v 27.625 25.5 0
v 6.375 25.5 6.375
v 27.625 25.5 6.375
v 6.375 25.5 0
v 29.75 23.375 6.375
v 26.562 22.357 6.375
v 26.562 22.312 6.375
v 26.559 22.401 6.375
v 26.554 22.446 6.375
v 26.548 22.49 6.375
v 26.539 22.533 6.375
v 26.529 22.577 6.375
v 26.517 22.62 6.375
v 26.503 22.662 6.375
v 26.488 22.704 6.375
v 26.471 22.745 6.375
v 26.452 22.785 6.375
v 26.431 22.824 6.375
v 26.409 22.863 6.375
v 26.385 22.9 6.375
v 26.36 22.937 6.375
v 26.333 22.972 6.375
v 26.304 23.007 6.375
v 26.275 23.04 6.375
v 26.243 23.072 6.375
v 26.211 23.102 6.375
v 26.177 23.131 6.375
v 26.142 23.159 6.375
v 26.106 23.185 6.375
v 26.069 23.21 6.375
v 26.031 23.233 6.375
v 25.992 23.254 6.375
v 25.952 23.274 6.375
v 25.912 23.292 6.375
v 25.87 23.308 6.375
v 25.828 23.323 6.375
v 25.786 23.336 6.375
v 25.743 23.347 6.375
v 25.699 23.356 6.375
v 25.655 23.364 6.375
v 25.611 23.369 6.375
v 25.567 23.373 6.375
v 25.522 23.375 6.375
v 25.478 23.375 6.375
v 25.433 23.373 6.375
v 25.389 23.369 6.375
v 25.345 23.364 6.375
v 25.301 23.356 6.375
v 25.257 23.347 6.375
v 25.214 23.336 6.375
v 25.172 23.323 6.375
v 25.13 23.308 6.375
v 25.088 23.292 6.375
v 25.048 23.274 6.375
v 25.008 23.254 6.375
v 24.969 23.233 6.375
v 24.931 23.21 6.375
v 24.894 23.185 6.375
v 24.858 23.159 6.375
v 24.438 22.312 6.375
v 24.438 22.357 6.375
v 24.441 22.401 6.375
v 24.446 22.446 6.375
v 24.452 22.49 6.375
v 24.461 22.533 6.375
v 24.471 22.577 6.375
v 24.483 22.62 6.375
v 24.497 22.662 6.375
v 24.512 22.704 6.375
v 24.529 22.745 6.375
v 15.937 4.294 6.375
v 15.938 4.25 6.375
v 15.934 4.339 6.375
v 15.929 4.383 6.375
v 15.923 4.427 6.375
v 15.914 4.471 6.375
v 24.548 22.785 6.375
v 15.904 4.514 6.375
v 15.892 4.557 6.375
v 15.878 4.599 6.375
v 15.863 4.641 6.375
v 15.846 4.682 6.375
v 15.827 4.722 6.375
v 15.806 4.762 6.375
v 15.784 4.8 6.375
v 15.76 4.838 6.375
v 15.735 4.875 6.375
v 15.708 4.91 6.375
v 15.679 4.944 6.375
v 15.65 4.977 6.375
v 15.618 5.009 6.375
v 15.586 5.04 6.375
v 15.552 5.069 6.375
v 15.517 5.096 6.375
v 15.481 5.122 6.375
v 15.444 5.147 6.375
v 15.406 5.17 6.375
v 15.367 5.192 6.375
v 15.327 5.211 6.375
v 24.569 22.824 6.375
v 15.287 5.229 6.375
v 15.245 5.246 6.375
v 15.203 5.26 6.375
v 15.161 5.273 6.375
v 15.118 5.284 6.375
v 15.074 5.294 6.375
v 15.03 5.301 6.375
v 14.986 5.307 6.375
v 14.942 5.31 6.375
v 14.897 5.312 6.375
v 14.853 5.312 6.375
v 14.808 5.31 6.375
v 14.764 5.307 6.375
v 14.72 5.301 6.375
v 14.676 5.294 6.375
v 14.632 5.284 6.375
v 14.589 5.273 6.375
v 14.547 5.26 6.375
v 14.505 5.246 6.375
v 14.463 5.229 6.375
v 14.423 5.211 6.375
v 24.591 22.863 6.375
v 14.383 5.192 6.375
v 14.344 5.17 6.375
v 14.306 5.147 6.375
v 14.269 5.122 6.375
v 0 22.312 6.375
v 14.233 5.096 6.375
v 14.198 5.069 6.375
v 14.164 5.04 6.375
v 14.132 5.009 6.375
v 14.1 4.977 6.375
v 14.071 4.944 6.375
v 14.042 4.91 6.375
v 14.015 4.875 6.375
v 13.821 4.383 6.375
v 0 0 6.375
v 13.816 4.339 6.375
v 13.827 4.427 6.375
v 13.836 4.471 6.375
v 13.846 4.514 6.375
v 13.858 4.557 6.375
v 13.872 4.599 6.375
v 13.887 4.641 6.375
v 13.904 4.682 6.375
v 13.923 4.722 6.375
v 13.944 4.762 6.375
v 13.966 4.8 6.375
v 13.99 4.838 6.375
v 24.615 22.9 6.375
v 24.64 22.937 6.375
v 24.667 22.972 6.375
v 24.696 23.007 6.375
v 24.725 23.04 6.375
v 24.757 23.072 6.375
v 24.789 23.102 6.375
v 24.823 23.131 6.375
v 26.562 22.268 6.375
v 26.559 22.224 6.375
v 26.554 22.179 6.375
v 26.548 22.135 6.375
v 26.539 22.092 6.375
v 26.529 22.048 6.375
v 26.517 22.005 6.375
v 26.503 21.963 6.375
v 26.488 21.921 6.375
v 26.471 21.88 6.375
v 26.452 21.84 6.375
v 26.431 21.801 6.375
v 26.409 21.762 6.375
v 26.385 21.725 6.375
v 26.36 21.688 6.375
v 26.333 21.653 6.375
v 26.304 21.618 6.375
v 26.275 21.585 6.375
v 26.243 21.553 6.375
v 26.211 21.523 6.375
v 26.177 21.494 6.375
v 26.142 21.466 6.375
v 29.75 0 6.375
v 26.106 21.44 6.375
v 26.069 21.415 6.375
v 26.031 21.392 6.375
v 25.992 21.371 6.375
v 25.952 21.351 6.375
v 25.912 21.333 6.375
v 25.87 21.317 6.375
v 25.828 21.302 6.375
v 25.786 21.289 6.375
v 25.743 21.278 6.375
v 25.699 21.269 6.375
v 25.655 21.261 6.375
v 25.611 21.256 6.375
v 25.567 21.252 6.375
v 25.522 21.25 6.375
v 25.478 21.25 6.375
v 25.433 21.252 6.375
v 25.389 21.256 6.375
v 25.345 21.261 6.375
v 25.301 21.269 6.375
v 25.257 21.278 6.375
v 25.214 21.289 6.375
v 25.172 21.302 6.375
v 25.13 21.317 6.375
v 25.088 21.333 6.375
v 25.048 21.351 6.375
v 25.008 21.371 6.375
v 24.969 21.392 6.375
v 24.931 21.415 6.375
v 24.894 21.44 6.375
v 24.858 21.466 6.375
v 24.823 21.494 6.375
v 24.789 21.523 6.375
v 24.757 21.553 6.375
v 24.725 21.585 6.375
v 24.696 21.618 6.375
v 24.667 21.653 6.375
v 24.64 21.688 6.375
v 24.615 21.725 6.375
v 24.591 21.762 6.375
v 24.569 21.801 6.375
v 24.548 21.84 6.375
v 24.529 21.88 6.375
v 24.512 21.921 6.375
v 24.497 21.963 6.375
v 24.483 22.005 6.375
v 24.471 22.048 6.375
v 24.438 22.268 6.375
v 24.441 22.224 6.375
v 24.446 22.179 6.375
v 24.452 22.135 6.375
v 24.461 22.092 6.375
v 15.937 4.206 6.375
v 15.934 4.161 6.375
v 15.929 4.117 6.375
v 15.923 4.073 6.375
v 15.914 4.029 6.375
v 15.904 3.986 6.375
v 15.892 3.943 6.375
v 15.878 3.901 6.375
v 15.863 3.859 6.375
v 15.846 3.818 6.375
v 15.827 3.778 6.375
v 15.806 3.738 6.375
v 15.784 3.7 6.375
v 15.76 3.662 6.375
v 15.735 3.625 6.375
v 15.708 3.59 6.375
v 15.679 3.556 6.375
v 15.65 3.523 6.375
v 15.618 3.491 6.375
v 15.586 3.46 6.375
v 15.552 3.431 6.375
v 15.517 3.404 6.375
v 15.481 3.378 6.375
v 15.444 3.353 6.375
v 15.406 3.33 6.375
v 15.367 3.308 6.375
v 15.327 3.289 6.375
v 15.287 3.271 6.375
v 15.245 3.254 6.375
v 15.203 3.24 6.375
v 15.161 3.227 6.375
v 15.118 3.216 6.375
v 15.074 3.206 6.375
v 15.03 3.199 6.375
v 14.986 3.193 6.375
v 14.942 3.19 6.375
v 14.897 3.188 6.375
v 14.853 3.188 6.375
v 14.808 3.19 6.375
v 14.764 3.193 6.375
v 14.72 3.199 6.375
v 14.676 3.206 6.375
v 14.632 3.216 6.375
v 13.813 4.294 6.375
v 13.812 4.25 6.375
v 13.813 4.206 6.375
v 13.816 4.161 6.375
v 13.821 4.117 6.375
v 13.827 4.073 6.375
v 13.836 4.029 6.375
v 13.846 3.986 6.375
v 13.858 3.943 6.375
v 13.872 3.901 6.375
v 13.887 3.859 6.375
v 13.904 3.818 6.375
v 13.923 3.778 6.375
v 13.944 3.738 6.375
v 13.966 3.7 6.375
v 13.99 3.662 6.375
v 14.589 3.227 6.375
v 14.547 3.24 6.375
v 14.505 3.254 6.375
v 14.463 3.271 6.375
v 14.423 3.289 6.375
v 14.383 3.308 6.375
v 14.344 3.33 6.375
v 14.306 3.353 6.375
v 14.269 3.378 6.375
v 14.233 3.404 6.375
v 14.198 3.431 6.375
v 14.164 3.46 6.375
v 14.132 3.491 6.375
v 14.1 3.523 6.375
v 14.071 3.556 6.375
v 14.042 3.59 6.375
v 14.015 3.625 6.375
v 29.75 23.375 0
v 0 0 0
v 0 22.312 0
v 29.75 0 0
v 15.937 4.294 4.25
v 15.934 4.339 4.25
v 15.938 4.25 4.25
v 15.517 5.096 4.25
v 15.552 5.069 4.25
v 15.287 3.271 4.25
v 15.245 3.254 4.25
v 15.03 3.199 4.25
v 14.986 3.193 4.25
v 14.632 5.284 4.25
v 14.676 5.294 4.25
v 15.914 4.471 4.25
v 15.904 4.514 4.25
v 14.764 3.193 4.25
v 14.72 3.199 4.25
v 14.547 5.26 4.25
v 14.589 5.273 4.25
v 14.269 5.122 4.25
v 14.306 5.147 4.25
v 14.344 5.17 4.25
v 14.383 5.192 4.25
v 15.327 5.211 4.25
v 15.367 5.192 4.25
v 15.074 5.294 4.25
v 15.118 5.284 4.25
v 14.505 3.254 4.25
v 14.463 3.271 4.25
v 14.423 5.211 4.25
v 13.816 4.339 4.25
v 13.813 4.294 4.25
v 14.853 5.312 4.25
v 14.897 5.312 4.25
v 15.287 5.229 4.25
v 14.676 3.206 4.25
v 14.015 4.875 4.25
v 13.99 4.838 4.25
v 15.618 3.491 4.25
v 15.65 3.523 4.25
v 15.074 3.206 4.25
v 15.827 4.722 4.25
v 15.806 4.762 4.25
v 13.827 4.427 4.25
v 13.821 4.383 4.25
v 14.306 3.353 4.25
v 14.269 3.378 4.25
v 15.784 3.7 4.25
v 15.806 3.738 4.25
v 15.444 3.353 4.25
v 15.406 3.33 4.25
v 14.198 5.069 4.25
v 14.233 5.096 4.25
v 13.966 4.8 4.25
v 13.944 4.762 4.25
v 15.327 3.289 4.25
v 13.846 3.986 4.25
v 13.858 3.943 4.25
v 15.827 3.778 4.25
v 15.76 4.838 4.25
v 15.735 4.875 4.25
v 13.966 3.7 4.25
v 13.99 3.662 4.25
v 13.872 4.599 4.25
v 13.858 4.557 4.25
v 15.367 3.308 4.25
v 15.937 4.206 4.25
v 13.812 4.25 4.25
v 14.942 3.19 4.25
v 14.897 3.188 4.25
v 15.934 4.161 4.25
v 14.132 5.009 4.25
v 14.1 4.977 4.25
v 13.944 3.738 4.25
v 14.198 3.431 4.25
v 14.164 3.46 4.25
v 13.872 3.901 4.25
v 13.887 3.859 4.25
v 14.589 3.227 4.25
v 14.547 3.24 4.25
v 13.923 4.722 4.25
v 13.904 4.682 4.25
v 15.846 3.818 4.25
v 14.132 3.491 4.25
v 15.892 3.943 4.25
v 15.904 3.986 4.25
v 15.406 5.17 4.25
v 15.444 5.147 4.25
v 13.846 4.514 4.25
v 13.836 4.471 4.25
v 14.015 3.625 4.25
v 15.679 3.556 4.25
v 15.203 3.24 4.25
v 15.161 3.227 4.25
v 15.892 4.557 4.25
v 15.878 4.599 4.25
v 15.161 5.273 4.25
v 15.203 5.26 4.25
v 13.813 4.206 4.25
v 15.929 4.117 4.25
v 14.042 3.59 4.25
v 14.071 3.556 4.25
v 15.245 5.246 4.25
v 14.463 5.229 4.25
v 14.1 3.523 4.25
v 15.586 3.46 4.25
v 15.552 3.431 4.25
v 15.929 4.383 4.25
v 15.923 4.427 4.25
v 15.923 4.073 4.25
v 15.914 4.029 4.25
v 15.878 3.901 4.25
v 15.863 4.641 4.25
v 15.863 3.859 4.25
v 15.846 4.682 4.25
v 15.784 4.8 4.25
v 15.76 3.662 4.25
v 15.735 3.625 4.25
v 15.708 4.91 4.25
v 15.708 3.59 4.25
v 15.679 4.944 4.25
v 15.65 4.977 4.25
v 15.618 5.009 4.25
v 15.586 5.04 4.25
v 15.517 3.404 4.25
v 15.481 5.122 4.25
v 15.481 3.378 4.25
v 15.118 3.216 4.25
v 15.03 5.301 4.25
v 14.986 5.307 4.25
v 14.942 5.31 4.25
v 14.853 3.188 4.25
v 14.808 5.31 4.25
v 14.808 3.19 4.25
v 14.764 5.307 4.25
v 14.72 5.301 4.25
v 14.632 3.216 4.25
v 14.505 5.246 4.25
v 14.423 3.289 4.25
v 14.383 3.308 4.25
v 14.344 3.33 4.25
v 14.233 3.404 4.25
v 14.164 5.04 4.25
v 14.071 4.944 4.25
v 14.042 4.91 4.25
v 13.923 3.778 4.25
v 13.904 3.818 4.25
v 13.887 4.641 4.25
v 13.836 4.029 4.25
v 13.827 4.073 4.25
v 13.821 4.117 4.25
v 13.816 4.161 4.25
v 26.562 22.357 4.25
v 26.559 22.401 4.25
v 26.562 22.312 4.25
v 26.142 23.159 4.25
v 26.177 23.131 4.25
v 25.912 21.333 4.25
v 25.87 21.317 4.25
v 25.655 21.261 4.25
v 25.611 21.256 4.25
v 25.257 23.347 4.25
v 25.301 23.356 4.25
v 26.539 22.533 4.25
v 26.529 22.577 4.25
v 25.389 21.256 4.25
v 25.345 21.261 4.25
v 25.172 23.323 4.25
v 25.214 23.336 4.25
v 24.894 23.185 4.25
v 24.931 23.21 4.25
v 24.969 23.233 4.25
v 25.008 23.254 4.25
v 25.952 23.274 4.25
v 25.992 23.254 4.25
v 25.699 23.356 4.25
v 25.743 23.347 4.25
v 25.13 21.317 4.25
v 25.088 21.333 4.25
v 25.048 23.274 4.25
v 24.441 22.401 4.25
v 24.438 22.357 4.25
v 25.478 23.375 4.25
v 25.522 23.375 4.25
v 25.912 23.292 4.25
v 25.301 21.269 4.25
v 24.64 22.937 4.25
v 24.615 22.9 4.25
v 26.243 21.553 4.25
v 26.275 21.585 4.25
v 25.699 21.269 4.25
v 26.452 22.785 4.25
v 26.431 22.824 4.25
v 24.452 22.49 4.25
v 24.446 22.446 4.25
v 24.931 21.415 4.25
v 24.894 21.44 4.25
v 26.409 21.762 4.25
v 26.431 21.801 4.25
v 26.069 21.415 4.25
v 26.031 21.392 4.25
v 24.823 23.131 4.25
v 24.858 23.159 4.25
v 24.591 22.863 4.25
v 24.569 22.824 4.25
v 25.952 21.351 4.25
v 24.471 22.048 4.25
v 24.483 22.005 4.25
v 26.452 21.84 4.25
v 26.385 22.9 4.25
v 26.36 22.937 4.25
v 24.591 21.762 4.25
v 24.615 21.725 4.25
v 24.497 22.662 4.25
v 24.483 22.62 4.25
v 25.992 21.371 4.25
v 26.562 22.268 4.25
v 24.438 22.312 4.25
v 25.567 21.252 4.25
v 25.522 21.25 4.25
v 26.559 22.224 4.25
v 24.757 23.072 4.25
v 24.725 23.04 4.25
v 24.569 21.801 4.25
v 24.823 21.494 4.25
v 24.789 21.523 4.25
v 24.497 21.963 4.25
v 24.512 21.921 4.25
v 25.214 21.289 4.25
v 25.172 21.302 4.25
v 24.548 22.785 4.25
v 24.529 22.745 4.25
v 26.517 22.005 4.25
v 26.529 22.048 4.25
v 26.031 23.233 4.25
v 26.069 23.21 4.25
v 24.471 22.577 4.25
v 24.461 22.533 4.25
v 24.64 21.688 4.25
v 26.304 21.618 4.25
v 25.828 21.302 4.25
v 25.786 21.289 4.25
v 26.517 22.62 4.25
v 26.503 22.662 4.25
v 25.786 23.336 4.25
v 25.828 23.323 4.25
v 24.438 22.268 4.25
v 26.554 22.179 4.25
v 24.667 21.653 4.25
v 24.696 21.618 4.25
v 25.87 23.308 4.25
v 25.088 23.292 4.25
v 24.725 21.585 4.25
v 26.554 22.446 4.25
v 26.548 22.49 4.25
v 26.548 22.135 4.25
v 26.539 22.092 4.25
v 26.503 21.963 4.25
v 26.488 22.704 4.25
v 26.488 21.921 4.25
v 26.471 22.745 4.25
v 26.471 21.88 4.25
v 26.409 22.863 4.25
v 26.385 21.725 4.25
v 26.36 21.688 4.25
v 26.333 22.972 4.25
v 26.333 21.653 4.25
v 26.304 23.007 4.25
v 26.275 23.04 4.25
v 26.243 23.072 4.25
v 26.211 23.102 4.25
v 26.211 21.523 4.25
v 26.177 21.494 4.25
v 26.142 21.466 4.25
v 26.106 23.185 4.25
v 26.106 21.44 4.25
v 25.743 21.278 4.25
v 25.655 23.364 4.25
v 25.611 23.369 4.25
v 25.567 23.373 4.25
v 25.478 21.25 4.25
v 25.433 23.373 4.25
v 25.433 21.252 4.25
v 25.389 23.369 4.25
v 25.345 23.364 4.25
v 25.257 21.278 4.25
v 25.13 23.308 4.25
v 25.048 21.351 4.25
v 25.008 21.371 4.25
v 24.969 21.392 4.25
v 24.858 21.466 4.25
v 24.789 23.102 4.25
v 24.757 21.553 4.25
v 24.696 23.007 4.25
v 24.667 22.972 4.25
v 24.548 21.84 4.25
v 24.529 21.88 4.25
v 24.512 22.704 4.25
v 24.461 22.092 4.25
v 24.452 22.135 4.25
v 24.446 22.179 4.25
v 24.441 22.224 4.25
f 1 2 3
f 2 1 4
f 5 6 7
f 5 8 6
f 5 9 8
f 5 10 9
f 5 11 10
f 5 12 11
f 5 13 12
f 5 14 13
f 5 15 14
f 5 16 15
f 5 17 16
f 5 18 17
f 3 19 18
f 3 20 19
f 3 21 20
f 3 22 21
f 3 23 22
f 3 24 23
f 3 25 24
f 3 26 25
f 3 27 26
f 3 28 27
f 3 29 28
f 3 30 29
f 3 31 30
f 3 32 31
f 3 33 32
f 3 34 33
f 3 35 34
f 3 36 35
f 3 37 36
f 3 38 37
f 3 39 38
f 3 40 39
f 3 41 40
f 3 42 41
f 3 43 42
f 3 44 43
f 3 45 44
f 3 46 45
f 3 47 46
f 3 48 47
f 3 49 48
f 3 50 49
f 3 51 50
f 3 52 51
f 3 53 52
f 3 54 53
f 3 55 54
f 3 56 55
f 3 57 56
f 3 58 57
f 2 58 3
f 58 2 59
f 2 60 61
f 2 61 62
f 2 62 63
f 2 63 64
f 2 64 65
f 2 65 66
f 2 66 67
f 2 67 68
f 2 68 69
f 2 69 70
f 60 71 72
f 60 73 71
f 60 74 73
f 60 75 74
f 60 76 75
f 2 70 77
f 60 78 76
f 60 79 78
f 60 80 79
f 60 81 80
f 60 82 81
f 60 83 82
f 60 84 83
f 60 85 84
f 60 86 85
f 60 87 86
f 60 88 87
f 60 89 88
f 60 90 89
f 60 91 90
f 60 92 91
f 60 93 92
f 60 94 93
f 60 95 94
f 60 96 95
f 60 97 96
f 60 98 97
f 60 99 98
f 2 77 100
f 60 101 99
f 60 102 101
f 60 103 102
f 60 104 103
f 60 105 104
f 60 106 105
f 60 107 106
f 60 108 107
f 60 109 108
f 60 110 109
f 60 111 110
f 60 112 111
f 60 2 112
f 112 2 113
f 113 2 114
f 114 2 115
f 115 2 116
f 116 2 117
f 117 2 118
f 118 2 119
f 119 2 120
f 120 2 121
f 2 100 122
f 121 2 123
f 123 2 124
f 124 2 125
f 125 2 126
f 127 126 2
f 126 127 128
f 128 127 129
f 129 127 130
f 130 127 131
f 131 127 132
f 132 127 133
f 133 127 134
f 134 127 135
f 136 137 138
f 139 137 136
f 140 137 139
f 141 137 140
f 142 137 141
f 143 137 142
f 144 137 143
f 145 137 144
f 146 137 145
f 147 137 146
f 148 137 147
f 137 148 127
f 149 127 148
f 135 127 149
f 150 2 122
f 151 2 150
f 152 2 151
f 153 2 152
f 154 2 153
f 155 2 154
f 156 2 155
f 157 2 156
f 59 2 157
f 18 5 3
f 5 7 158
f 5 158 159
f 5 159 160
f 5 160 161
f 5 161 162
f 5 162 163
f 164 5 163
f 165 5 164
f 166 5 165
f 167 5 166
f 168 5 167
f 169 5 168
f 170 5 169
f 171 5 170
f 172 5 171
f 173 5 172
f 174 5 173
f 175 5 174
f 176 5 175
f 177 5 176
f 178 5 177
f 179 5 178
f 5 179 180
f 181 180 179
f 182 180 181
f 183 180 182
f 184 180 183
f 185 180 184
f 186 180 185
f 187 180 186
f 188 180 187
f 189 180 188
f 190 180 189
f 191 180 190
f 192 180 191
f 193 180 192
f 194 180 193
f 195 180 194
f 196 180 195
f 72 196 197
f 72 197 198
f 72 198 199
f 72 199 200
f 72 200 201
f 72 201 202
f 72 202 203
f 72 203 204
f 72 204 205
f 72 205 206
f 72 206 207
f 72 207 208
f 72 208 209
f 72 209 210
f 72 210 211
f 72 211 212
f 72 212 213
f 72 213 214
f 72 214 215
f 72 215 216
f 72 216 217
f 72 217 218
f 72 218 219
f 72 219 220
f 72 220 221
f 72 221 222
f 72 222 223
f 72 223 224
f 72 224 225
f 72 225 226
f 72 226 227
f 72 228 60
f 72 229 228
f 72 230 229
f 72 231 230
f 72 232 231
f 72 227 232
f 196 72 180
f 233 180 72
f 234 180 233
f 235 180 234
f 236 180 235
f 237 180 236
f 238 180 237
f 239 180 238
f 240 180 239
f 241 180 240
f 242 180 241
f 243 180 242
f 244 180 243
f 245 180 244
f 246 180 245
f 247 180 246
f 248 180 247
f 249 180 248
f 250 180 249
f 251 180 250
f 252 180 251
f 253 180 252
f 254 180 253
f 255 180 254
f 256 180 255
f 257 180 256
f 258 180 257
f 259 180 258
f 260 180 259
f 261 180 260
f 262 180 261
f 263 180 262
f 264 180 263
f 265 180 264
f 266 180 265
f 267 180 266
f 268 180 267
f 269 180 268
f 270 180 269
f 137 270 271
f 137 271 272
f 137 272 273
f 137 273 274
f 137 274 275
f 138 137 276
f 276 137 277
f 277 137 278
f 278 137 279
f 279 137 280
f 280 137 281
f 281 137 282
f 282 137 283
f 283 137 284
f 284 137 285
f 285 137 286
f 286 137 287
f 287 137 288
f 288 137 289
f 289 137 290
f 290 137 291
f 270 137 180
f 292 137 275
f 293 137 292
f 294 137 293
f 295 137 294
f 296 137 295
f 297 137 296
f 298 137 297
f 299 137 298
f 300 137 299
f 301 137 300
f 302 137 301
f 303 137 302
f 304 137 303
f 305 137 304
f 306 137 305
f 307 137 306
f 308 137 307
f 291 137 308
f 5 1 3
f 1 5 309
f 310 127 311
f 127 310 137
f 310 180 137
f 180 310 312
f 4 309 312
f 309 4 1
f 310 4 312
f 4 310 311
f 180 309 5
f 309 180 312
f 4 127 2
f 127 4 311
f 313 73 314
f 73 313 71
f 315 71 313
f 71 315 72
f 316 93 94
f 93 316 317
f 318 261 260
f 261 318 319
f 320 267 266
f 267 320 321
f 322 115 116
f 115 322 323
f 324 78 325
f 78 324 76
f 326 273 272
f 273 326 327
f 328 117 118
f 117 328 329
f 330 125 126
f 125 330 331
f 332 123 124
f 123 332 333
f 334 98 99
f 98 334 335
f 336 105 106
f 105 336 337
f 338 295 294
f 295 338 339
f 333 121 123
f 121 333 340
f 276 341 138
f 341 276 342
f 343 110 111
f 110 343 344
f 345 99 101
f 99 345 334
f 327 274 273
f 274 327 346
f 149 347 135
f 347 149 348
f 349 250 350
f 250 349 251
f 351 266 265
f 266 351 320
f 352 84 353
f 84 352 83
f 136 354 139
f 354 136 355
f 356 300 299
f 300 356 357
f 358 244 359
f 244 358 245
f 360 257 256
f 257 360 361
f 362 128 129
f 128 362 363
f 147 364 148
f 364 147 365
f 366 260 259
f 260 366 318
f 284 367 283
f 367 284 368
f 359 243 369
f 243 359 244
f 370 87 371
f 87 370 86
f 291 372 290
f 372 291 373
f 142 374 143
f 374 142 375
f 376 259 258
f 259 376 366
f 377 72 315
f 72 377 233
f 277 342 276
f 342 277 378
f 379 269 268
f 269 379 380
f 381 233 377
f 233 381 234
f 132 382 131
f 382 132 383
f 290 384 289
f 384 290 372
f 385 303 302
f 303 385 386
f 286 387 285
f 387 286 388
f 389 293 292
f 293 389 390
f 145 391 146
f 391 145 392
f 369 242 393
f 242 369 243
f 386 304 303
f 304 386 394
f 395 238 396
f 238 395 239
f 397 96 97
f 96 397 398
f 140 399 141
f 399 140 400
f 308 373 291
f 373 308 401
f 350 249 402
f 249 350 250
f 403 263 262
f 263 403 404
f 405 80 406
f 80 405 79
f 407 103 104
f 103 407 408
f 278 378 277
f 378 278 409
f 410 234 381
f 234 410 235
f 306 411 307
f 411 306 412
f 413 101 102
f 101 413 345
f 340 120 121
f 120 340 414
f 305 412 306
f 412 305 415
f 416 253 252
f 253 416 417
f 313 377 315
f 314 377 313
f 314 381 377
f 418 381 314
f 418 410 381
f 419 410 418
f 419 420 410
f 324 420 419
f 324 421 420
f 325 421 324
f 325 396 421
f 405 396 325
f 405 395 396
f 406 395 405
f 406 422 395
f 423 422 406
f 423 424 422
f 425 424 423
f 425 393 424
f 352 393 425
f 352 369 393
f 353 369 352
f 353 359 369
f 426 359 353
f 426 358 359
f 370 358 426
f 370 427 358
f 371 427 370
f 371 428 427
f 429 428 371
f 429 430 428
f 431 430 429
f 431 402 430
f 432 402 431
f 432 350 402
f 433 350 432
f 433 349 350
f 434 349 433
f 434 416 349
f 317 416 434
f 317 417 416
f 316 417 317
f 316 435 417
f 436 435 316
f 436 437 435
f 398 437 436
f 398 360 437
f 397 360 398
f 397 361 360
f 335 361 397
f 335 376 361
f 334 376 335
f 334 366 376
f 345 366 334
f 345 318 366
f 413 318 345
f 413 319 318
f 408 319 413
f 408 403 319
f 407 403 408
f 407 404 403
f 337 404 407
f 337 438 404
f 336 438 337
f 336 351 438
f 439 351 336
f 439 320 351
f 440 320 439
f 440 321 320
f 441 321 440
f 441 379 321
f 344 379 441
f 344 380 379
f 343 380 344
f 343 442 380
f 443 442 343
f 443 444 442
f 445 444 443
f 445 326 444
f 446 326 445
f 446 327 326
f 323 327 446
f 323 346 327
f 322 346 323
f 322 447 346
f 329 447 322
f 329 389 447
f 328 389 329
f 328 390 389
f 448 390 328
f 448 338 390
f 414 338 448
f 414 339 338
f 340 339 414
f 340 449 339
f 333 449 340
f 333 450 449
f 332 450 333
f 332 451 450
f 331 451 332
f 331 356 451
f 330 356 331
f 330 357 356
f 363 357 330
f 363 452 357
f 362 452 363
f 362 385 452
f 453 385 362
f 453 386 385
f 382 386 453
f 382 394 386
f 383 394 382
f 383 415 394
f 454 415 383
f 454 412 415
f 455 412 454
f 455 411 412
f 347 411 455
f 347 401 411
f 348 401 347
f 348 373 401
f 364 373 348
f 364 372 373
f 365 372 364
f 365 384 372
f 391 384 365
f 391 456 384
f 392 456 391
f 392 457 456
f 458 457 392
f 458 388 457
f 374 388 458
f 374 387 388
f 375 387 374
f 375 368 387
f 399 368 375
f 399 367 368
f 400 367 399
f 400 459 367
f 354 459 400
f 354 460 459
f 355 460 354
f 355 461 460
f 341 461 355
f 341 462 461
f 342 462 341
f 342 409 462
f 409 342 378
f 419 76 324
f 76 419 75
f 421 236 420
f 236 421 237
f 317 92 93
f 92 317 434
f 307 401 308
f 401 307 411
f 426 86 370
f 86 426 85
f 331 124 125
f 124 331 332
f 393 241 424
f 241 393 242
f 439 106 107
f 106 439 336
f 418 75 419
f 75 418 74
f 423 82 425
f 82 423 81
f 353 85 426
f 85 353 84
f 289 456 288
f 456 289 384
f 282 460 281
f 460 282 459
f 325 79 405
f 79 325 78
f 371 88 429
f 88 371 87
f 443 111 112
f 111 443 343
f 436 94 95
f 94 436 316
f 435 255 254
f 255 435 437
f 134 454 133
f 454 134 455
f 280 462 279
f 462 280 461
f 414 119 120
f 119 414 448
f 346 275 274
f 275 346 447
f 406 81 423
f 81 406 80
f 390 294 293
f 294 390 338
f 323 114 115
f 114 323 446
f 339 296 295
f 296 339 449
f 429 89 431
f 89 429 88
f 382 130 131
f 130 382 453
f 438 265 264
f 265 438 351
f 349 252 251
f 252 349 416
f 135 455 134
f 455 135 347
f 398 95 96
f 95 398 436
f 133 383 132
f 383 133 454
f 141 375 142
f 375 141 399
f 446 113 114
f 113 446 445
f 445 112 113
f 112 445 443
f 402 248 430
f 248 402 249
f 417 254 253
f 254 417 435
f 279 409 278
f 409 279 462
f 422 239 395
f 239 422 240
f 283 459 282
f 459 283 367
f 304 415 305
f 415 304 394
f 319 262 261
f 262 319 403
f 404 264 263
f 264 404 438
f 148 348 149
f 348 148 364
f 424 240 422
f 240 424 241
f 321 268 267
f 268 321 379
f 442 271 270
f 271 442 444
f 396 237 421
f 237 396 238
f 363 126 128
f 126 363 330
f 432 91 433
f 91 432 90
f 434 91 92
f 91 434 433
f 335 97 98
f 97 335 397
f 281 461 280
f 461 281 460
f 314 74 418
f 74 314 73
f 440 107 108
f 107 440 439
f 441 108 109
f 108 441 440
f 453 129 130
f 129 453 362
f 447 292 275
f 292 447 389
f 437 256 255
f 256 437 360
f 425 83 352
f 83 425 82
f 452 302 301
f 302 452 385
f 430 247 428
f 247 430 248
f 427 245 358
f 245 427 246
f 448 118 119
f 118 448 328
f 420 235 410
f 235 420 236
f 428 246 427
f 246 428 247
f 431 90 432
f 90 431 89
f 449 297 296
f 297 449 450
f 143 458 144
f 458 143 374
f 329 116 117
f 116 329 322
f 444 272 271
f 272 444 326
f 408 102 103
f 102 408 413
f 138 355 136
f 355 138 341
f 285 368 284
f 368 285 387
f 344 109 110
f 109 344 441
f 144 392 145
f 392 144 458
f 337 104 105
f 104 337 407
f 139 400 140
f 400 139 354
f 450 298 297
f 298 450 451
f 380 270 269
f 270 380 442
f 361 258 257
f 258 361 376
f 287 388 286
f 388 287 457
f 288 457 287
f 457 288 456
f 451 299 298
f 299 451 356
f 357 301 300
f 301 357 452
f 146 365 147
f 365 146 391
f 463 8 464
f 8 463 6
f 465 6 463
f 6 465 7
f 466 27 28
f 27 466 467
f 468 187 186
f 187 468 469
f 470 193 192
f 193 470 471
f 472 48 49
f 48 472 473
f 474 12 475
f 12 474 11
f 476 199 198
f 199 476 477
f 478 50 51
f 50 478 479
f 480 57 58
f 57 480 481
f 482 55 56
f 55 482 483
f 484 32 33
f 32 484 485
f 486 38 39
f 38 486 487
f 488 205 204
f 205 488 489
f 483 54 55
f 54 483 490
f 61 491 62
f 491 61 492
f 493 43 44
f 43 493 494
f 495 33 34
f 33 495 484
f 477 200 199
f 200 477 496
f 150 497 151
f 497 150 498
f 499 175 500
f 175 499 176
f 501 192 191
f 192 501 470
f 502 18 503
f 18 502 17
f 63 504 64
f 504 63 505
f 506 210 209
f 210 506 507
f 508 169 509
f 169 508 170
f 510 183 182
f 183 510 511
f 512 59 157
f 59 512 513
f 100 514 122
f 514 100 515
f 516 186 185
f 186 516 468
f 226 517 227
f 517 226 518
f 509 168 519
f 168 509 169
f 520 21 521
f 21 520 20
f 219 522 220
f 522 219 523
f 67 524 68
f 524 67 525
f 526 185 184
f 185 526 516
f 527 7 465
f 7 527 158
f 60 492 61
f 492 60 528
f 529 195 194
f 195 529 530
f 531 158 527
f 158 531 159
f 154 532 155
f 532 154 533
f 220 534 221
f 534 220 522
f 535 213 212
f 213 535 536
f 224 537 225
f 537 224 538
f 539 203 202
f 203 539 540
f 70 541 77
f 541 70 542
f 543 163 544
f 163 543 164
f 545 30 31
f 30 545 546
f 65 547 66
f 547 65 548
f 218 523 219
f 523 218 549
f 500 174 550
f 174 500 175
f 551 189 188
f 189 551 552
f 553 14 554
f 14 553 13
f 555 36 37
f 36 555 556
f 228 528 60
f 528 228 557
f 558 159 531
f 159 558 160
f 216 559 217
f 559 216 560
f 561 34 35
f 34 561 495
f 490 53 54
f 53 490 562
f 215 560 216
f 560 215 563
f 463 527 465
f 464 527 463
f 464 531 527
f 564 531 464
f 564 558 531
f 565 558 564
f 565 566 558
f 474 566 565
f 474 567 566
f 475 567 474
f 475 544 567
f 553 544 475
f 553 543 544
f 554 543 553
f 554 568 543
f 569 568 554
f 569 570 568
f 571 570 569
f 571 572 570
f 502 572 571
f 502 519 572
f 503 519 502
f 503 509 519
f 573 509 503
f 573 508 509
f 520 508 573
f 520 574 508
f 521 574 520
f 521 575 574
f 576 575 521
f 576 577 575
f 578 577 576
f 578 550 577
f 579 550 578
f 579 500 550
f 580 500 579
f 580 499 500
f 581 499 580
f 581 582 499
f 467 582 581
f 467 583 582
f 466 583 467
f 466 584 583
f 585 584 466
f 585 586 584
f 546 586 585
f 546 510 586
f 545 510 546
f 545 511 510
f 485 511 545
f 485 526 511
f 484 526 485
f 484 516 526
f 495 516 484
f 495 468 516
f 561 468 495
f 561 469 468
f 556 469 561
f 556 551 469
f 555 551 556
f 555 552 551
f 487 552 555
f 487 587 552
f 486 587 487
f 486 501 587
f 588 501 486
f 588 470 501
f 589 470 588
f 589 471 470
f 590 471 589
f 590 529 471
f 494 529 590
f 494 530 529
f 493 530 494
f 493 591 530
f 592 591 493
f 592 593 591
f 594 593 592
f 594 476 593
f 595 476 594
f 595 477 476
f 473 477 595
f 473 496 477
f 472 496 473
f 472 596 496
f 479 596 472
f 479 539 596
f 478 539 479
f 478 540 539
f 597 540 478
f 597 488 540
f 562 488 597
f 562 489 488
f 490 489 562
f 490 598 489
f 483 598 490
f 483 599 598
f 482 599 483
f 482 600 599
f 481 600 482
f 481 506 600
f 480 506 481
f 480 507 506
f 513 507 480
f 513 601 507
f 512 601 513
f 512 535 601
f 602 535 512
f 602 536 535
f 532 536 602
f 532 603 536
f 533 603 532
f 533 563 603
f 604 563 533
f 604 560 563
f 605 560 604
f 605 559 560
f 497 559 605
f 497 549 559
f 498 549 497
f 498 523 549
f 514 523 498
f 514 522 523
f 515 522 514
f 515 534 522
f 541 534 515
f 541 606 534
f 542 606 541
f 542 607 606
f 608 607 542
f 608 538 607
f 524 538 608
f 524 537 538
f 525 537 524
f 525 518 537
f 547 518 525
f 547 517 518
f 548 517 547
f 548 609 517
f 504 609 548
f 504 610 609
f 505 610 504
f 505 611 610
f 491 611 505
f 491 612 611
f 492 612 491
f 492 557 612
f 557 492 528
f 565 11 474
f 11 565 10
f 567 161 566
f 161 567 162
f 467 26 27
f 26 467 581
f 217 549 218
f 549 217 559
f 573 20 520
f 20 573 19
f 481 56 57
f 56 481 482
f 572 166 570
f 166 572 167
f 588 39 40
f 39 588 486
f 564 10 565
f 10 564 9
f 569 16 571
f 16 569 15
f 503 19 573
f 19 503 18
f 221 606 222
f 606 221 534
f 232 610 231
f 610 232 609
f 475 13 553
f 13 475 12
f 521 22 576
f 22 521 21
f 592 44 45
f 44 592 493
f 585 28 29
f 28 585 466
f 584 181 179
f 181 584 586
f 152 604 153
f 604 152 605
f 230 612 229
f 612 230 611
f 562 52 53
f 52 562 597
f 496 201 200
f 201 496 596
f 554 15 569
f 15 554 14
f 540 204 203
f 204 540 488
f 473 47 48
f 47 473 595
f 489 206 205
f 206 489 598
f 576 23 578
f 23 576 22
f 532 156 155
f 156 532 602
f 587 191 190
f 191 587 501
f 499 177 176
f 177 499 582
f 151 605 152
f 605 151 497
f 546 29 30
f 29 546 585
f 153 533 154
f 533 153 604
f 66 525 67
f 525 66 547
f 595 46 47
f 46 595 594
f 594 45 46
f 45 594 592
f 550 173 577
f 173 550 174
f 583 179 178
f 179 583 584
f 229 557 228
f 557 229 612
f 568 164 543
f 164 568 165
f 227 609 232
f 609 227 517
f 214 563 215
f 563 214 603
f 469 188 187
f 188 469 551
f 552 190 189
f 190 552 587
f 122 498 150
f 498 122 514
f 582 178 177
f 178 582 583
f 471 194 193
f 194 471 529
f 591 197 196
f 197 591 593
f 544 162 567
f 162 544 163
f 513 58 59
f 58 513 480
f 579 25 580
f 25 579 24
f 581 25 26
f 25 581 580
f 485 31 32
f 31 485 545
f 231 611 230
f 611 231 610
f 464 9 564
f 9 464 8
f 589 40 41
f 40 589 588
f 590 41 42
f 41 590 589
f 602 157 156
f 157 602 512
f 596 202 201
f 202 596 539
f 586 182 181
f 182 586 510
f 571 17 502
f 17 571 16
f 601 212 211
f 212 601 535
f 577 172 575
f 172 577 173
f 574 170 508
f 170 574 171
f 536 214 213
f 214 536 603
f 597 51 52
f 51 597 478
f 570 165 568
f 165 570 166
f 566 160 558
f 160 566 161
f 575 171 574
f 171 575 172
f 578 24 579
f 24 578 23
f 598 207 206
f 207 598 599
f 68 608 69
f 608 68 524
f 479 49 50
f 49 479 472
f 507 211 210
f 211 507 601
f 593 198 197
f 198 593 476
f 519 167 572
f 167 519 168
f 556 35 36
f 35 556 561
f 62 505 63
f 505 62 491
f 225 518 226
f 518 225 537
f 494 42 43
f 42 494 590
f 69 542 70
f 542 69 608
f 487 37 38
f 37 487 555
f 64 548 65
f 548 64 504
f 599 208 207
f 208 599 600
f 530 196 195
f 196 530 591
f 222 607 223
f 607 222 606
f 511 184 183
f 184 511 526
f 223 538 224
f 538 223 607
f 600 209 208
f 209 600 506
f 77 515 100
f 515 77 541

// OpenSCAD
$fn = 150;

difference() {
	linear_extrude(height = 6.375) {
		polygon(points = [[0, 0], [0, 22.3125], [6.375, 25.5], [27.625, 25.5], [29.75, 23.375], [29.75, 0]]);
	}
	translate(v = [14.875, 4.25, 4.25]) {
		cylinder(d = 2.125, h = 3.125);
	}
	translate(v = [25.5, 22.3125, 4.25]) {
		cylinder(d = 2.125, h = 3.125);
	}
}
